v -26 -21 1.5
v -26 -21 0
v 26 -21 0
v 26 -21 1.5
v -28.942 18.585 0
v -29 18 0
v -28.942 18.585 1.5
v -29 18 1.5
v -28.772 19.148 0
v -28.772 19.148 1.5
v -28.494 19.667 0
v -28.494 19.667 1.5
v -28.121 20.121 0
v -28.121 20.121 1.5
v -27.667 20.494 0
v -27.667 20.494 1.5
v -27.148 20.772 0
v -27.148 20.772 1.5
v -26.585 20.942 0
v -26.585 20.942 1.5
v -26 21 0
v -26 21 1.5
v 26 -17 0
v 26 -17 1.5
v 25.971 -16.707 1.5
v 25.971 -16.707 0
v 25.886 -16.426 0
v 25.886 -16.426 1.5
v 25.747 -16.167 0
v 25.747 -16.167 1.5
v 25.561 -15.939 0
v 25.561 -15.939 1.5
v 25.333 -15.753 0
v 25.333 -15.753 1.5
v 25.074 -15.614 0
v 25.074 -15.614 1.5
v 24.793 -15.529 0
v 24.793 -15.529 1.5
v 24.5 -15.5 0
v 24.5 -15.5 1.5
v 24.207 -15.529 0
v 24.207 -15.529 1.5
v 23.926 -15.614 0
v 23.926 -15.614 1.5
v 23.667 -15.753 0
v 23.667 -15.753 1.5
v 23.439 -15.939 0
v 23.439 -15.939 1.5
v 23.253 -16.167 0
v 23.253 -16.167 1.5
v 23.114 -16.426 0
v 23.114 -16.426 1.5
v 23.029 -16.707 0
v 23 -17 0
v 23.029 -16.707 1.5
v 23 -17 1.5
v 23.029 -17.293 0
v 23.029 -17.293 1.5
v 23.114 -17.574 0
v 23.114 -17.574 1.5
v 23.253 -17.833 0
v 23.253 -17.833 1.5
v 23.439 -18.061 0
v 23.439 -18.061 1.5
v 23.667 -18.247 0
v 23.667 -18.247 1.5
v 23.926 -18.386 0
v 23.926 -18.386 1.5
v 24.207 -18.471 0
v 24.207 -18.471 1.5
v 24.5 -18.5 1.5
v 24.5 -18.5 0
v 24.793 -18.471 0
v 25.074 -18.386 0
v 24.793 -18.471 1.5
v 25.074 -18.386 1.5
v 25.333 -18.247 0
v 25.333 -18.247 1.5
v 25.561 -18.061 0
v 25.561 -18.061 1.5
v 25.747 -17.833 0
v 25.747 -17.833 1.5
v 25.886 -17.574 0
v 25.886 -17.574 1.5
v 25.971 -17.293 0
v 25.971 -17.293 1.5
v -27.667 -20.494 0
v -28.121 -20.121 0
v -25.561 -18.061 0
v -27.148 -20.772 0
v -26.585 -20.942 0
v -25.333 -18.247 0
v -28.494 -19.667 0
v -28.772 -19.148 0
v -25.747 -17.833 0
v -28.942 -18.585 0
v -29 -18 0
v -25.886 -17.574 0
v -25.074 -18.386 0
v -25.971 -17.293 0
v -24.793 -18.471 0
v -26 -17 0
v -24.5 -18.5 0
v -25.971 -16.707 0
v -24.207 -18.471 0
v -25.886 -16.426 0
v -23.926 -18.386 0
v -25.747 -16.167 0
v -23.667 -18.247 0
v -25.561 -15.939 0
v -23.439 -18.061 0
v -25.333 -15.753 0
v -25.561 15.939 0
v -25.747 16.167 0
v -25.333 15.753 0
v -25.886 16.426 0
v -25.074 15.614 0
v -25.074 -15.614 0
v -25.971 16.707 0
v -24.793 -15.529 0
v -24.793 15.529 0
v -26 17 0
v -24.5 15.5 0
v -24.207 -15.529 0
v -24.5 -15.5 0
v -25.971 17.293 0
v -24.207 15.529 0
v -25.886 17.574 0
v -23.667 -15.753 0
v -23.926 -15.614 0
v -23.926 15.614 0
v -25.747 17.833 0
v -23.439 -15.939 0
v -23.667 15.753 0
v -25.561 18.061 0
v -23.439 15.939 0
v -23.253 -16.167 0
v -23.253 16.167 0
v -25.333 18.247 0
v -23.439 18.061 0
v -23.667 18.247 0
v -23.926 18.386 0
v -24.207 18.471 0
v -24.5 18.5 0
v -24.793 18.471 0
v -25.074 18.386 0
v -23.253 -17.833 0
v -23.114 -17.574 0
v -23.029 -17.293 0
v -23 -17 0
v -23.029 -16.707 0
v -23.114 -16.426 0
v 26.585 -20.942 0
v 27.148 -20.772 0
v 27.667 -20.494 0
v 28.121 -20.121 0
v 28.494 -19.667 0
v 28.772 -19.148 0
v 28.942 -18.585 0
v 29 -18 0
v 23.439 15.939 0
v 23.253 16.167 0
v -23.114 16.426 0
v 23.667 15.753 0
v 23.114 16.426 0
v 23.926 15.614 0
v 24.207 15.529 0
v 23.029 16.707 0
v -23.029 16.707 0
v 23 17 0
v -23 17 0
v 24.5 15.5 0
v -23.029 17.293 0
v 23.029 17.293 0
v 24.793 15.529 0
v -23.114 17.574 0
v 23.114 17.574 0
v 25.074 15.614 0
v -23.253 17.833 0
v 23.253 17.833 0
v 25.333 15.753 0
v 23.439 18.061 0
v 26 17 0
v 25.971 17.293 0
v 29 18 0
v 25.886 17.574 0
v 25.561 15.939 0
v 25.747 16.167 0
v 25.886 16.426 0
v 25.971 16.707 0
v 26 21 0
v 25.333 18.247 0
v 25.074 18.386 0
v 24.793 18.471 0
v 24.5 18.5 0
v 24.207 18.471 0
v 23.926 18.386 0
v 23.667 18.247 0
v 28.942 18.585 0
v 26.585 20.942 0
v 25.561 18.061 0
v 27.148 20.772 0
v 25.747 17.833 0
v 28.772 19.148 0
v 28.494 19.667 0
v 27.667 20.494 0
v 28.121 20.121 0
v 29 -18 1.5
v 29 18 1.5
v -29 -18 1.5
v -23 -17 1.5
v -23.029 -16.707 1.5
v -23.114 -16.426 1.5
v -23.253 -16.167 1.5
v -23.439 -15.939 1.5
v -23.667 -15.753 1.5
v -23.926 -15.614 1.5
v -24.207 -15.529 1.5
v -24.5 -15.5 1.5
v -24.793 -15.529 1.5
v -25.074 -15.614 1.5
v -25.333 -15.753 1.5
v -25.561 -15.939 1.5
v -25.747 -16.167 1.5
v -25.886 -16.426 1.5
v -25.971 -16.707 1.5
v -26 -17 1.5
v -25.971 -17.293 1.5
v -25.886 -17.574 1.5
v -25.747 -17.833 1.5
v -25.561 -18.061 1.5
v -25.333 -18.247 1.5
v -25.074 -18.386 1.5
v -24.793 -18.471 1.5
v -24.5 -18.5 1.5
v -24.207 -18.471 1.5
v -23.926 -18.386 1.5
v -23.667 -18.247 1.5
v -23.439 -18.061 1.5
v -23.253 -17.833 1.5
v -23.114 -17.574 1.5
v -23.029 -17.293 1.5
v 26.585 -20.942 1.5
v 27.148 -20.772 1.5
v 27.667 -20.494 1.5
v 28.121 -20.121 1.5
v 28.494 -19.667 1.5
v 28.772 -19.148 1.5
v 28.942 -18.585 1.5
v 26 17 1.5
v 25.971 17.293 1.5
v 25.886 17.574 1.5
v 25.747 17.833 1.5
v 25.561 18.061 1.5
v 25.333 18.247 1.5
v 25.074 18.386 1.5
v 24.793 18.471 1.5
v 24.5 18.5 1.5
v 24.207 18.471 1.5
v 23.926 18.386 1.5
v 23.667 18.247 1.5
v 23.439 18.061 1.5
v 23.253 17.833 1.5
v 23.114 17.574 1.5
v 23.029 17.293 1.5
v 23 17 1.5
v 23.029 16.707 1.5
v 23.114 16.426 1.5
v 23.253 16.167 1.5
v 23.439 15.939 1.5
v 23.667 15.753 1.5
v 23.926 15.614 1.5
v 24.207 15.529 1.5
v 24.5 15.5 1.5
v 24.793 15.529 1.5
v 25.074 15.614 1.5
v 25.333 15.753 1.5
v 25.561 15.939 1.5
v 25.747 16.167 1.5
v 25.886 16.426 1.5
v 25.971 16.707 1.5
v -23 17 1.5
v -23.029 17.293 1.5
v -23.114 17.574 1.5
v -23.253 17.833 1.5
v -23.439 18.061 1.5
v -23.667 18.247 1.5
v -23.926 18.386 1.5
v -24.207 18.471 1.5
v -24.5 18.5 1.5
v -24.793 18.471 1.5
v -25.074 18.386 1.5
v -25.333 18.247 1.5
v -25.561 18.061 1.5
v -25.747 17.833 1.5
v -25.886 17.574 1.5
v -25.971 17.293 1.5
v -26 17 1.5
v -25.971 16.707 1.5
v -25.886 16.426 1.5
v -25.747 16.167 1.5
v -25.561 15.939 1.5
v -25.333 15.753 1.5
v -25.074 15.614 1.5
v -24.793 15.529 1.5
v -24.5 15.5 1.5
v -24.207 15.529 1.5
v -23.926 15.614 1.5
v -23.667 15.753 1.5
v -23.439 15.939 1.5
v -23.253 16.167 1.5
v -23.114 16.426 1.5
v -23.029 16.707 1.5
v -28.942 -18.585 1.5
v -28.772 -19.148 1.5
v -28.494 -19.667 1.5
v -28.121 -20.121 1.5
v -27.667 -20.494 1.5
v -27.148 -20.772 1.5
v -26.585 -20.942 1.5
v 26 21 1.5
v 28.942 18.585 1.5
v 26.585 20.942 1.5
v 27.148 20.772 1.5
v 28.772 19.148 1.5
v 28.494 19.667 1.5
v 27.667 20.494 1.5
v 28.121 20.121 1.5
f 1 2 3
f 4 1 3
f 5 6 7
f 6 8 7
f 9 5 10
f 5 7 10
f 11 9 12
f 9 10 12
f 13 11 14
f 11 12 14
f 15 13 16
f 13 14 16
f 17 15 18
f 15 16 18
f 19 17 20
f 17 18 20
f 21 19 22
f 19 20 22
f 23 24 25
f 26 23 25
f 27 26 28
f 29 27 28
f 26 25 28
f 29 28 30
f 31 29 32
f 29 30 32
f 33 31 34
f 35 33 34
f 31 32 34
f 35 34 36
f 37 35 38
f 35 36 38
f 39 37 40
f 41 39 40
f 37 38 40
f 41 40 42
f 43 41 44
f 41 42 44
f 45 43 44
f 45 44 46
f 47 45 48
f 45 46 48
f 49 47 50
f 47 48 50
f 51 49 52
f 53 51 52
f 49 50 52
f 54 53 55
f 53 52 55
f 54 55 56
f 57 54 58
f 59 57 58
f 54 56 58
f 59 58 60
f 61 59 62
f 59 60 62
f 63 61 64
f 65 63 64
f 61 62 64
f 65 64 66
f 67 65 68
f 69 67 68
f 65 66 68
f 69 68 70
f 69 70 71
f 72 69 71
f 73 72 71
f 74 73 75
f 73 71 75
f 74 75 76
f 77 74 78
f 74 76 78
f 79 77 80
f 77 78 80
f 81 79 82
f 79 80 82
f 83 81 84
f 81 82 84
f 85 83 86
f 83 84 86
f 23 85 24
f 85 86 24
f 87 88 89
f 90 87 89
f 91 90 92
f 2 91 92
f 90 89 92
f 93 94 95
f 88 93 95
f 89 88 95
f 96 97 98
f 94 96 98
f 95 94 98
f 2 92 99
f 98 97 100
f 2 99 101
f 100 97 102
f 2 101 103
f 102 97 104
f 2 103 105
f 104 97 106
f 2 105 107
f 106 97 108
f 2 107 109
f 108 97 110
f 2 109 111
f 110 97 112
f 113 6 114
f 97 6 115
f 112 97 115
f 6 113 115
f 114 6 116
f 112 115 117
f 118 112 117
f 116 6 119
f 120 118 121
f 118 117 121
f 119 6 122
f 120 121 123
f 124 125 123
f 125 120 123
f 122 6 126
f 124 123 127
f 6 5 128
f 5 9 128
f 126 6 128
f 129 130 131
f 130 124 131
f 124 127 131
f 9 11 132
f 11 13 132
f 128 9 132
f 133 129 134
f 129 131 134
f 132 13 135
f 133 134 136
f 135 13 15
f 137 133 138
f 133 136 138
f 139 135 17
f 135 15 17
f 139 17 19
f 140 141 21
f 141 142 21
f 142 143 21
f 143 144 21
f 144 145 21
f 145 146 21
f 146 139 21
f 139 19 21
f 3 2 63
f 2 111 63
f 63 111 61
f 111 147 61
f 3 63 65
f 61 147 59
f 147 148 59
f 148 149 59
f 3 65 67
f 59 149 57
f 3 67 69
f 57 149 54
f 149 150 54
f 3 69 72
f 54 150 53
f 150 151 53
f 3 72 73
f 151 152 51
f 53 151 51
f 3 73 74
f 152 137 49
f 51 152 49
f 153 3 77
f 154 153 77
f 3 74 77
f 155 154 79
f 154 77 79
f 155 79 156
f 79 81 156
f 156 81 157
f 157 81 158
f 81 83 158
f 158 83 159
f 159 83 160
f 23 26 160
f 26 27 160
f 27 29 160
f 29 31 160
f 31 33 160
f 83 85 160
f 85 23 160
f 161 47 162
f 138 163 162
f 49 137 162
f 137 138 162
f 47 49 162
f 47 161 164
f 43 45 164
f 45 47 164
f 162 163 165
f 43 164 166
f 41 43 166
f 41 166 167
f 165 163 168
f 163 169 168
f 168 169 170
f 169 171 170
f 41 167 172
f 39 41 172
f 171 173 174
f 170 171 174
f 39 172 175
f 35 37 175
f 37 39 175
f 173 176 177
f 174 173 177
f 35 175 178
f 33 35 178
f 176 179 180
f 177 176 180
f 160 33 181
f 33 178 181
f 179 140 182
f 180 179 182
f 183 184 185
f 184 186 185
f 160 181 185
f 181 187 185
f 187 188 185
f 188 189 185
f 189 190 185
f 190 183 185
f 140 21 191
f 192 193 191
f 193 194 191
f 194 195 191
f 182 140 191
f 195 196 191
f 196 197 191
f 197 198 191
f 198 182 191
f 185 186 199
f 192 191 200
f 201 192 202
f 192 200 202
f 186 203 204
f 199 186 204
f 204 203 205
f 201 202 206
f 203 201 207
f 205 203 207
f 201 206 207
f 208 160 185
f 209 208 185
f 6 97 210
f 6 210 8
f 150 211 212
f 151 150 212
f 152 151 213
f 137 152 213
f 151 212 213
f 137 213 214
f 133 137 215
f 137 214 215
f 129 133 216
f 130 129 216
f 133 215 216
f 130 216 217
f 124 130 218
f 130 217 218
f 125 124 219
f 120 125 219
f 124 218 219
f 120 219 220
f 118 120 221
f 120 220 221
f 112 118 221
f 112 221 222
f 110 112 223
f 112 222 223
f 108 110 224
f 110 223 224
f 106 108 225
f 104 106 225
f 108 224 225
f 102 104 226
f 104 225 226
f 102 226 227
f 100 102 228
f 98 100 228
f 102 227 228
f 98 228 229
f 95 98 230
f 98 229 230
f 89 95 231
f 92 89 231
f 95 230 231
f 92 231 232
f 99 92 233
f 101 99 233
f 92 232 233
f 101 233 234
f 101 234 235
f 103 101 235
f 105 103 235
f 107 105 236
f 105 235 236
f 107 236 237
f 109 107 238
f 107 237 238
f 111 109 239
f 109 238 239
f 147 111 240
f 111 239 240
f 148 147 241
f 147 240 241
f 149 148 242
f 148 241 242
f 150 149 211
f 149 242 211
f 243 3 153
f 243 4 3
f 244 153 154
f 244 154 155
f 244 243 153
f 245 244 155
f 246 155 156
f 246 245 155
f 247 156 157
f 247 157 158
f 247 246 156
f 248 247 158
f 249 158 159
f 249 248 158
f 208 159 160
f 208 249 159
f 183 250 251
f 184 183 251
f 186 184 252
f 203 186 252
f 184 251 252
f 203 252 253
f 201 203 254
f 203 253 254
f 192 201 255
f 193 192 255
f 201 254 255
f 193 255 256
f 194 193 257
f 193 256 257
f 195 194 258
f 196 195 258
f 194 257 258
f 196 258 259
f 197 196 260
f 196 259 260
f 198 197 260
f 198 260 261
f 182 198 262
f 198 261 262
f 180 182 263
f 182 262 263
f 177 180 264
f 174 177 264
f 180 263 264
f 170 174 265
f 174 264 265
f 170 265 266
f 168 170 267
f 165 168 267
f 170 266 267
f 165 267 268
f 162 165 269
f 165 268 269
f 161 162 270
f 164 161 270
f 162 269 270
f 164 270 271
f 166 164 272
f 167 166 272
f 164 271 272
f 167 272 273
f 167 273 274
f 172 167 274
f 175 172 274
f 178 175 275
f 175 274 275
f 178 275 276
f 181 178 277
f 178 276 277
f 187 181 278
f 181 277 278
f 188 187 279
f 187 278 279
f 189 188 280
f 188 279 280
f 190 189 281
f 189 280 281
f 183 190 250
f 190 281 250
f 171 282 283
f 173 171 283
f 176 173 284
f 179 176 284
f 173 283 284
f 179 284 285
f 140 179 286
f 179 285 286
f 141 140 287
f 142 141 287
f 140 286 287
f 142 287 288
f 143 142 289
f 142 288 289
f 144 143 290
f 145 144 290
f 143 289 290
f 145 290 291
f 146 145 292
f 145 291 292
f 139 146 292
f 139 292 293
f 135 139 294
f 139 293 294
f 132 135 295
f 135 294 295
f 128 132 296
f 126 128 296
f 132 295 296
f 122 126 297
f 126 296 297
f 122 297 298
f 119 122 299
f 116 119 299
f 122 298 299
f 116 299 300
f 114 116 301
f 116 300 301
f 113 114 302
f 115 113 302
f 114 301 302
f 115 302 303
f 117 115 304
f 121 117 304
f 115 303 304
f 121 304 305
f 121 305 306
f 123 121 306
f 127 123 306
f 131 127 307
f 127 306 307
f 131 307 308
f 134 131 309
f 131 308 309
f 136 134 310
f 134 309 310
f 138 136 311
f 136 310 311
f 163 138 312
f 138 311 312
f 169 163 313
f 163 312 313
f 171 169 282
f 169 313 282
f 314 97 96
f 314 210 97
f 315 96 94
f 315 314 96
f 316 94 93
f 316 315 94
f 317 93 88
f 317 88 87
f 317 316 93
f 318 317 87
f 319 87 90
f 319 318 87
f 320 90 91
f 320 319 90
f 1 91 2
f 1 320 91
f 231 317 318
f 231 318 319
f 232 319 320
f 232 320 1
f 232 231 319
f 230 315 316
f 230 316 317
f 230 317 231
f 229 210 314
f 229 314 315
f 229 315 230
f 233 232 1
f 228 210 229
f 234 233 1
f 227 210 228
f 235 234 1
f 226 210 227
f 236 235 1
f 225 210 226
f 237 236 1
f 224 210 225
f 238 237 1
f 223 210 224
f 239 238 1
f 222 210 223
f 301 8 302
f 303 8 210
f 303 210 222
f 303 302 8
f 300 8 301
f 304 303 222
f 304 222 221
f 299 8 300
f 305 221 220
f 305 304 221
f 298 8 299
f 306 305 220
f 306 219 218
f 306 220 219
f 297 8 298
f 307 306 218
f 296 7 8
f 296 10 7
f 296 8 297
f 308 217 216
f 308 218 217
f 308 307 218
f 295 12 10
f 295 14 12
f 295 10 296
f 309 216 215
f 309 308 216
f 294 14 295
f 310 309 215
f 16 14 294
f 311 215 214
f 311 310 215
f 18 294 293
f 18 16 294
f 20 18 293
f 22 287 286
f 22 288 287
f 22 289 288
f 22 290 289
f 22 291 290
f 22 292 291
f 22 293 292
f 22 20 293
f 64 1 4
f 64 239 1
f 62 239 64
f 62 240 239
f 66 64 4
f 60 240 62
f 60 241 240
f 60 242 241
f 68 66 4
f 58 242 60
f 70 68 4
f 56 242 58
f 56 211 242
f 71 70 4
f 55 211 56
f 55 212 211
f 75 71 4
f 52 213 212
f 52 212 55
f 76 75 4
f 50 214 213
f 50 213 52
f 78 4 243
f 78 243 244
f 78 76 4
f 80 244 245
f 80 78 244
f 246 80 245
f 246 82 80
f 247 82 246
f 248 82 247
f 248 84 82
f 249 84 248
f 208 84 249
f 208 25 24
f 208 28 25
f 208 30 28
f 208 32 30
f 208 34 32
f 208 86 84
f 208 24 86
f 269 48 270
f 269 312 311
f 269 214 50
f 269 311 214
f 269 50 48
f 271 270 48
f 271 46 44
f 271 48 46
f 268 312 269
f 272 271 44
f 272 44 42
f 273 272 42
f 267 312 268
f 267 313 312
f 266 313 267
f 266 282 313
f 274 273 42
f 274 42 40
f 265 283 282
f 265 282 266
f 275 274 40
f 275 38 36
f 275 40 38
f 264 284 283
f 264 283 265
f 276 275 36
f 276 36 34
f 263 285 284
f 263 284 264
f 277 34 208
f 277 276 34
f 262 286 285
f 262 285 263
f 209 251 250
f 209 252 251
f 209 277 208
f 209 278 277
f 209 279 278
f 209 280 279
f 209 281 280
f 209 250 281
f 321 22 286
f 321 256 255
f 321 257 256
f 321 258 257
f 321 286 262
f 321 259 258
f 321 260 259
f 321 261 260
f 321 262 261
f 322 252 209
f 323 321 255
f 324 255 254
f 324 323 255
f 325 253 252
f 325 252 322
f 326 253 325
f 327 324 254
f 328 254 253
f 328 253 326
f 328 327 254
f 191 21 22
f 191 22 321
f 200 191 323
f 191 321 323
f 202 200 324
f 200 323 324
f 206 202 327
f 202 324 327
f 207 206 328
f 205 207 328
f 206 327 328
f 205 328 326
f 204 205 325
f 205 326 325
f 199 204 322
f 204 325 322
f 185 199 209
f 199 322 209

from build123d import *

# Parameters (mm, degrees)
SKETCH_1_W          = 58
SKETCH_1_H          = 42
EXTRUDE_1_DEPTH     = 1.5
SKETCH_2_R          = 1.5
CUT_EXTRUDE_1_DEPTH = 1.5
FILLET_1_R          = 3


with BuildPart() as part:
    # 草图1 → 凸台-拉伸1 (new body)
    with BuildSketch(Plane.XY):
        Rectangle(SKETCH_1_W, SKETCH_1_H)
    extrude(amount=EXTRUDE_1_DEPTH)

    # 草图2 → 切除-拉伸1 (cut)
    with BuildSketch(Plane.XY.offset(1.5)):
        with Locations((-24.5, 17)):
            Circle(SKETCH_2_R)
        with Locations((-24.5, -17)):
            Circle(SKETCH_2_R)
        with Locations((24.5, -17)):
            Circle(SKETCH_2_R)
        with Locations((24.5, 17)):
            Circle(SKETCH_2_R)
    extrude(amount=-CUT_EXTRUDE_1_DEPTH, mode=Mode.SUBTRACT)

    # 圆角1
    fillet_1_edges = [part.edges().sort_by_distance(p)[0] for p in [
        (29, -21, 0.75),
        (-29, -21, 0.75),
        (-29, 21, 0.75),
        (29, 21, 0.75),
    ]]
    fillet(fillet_1_edges, radius=FILLET_1_R)


solid = part.part
